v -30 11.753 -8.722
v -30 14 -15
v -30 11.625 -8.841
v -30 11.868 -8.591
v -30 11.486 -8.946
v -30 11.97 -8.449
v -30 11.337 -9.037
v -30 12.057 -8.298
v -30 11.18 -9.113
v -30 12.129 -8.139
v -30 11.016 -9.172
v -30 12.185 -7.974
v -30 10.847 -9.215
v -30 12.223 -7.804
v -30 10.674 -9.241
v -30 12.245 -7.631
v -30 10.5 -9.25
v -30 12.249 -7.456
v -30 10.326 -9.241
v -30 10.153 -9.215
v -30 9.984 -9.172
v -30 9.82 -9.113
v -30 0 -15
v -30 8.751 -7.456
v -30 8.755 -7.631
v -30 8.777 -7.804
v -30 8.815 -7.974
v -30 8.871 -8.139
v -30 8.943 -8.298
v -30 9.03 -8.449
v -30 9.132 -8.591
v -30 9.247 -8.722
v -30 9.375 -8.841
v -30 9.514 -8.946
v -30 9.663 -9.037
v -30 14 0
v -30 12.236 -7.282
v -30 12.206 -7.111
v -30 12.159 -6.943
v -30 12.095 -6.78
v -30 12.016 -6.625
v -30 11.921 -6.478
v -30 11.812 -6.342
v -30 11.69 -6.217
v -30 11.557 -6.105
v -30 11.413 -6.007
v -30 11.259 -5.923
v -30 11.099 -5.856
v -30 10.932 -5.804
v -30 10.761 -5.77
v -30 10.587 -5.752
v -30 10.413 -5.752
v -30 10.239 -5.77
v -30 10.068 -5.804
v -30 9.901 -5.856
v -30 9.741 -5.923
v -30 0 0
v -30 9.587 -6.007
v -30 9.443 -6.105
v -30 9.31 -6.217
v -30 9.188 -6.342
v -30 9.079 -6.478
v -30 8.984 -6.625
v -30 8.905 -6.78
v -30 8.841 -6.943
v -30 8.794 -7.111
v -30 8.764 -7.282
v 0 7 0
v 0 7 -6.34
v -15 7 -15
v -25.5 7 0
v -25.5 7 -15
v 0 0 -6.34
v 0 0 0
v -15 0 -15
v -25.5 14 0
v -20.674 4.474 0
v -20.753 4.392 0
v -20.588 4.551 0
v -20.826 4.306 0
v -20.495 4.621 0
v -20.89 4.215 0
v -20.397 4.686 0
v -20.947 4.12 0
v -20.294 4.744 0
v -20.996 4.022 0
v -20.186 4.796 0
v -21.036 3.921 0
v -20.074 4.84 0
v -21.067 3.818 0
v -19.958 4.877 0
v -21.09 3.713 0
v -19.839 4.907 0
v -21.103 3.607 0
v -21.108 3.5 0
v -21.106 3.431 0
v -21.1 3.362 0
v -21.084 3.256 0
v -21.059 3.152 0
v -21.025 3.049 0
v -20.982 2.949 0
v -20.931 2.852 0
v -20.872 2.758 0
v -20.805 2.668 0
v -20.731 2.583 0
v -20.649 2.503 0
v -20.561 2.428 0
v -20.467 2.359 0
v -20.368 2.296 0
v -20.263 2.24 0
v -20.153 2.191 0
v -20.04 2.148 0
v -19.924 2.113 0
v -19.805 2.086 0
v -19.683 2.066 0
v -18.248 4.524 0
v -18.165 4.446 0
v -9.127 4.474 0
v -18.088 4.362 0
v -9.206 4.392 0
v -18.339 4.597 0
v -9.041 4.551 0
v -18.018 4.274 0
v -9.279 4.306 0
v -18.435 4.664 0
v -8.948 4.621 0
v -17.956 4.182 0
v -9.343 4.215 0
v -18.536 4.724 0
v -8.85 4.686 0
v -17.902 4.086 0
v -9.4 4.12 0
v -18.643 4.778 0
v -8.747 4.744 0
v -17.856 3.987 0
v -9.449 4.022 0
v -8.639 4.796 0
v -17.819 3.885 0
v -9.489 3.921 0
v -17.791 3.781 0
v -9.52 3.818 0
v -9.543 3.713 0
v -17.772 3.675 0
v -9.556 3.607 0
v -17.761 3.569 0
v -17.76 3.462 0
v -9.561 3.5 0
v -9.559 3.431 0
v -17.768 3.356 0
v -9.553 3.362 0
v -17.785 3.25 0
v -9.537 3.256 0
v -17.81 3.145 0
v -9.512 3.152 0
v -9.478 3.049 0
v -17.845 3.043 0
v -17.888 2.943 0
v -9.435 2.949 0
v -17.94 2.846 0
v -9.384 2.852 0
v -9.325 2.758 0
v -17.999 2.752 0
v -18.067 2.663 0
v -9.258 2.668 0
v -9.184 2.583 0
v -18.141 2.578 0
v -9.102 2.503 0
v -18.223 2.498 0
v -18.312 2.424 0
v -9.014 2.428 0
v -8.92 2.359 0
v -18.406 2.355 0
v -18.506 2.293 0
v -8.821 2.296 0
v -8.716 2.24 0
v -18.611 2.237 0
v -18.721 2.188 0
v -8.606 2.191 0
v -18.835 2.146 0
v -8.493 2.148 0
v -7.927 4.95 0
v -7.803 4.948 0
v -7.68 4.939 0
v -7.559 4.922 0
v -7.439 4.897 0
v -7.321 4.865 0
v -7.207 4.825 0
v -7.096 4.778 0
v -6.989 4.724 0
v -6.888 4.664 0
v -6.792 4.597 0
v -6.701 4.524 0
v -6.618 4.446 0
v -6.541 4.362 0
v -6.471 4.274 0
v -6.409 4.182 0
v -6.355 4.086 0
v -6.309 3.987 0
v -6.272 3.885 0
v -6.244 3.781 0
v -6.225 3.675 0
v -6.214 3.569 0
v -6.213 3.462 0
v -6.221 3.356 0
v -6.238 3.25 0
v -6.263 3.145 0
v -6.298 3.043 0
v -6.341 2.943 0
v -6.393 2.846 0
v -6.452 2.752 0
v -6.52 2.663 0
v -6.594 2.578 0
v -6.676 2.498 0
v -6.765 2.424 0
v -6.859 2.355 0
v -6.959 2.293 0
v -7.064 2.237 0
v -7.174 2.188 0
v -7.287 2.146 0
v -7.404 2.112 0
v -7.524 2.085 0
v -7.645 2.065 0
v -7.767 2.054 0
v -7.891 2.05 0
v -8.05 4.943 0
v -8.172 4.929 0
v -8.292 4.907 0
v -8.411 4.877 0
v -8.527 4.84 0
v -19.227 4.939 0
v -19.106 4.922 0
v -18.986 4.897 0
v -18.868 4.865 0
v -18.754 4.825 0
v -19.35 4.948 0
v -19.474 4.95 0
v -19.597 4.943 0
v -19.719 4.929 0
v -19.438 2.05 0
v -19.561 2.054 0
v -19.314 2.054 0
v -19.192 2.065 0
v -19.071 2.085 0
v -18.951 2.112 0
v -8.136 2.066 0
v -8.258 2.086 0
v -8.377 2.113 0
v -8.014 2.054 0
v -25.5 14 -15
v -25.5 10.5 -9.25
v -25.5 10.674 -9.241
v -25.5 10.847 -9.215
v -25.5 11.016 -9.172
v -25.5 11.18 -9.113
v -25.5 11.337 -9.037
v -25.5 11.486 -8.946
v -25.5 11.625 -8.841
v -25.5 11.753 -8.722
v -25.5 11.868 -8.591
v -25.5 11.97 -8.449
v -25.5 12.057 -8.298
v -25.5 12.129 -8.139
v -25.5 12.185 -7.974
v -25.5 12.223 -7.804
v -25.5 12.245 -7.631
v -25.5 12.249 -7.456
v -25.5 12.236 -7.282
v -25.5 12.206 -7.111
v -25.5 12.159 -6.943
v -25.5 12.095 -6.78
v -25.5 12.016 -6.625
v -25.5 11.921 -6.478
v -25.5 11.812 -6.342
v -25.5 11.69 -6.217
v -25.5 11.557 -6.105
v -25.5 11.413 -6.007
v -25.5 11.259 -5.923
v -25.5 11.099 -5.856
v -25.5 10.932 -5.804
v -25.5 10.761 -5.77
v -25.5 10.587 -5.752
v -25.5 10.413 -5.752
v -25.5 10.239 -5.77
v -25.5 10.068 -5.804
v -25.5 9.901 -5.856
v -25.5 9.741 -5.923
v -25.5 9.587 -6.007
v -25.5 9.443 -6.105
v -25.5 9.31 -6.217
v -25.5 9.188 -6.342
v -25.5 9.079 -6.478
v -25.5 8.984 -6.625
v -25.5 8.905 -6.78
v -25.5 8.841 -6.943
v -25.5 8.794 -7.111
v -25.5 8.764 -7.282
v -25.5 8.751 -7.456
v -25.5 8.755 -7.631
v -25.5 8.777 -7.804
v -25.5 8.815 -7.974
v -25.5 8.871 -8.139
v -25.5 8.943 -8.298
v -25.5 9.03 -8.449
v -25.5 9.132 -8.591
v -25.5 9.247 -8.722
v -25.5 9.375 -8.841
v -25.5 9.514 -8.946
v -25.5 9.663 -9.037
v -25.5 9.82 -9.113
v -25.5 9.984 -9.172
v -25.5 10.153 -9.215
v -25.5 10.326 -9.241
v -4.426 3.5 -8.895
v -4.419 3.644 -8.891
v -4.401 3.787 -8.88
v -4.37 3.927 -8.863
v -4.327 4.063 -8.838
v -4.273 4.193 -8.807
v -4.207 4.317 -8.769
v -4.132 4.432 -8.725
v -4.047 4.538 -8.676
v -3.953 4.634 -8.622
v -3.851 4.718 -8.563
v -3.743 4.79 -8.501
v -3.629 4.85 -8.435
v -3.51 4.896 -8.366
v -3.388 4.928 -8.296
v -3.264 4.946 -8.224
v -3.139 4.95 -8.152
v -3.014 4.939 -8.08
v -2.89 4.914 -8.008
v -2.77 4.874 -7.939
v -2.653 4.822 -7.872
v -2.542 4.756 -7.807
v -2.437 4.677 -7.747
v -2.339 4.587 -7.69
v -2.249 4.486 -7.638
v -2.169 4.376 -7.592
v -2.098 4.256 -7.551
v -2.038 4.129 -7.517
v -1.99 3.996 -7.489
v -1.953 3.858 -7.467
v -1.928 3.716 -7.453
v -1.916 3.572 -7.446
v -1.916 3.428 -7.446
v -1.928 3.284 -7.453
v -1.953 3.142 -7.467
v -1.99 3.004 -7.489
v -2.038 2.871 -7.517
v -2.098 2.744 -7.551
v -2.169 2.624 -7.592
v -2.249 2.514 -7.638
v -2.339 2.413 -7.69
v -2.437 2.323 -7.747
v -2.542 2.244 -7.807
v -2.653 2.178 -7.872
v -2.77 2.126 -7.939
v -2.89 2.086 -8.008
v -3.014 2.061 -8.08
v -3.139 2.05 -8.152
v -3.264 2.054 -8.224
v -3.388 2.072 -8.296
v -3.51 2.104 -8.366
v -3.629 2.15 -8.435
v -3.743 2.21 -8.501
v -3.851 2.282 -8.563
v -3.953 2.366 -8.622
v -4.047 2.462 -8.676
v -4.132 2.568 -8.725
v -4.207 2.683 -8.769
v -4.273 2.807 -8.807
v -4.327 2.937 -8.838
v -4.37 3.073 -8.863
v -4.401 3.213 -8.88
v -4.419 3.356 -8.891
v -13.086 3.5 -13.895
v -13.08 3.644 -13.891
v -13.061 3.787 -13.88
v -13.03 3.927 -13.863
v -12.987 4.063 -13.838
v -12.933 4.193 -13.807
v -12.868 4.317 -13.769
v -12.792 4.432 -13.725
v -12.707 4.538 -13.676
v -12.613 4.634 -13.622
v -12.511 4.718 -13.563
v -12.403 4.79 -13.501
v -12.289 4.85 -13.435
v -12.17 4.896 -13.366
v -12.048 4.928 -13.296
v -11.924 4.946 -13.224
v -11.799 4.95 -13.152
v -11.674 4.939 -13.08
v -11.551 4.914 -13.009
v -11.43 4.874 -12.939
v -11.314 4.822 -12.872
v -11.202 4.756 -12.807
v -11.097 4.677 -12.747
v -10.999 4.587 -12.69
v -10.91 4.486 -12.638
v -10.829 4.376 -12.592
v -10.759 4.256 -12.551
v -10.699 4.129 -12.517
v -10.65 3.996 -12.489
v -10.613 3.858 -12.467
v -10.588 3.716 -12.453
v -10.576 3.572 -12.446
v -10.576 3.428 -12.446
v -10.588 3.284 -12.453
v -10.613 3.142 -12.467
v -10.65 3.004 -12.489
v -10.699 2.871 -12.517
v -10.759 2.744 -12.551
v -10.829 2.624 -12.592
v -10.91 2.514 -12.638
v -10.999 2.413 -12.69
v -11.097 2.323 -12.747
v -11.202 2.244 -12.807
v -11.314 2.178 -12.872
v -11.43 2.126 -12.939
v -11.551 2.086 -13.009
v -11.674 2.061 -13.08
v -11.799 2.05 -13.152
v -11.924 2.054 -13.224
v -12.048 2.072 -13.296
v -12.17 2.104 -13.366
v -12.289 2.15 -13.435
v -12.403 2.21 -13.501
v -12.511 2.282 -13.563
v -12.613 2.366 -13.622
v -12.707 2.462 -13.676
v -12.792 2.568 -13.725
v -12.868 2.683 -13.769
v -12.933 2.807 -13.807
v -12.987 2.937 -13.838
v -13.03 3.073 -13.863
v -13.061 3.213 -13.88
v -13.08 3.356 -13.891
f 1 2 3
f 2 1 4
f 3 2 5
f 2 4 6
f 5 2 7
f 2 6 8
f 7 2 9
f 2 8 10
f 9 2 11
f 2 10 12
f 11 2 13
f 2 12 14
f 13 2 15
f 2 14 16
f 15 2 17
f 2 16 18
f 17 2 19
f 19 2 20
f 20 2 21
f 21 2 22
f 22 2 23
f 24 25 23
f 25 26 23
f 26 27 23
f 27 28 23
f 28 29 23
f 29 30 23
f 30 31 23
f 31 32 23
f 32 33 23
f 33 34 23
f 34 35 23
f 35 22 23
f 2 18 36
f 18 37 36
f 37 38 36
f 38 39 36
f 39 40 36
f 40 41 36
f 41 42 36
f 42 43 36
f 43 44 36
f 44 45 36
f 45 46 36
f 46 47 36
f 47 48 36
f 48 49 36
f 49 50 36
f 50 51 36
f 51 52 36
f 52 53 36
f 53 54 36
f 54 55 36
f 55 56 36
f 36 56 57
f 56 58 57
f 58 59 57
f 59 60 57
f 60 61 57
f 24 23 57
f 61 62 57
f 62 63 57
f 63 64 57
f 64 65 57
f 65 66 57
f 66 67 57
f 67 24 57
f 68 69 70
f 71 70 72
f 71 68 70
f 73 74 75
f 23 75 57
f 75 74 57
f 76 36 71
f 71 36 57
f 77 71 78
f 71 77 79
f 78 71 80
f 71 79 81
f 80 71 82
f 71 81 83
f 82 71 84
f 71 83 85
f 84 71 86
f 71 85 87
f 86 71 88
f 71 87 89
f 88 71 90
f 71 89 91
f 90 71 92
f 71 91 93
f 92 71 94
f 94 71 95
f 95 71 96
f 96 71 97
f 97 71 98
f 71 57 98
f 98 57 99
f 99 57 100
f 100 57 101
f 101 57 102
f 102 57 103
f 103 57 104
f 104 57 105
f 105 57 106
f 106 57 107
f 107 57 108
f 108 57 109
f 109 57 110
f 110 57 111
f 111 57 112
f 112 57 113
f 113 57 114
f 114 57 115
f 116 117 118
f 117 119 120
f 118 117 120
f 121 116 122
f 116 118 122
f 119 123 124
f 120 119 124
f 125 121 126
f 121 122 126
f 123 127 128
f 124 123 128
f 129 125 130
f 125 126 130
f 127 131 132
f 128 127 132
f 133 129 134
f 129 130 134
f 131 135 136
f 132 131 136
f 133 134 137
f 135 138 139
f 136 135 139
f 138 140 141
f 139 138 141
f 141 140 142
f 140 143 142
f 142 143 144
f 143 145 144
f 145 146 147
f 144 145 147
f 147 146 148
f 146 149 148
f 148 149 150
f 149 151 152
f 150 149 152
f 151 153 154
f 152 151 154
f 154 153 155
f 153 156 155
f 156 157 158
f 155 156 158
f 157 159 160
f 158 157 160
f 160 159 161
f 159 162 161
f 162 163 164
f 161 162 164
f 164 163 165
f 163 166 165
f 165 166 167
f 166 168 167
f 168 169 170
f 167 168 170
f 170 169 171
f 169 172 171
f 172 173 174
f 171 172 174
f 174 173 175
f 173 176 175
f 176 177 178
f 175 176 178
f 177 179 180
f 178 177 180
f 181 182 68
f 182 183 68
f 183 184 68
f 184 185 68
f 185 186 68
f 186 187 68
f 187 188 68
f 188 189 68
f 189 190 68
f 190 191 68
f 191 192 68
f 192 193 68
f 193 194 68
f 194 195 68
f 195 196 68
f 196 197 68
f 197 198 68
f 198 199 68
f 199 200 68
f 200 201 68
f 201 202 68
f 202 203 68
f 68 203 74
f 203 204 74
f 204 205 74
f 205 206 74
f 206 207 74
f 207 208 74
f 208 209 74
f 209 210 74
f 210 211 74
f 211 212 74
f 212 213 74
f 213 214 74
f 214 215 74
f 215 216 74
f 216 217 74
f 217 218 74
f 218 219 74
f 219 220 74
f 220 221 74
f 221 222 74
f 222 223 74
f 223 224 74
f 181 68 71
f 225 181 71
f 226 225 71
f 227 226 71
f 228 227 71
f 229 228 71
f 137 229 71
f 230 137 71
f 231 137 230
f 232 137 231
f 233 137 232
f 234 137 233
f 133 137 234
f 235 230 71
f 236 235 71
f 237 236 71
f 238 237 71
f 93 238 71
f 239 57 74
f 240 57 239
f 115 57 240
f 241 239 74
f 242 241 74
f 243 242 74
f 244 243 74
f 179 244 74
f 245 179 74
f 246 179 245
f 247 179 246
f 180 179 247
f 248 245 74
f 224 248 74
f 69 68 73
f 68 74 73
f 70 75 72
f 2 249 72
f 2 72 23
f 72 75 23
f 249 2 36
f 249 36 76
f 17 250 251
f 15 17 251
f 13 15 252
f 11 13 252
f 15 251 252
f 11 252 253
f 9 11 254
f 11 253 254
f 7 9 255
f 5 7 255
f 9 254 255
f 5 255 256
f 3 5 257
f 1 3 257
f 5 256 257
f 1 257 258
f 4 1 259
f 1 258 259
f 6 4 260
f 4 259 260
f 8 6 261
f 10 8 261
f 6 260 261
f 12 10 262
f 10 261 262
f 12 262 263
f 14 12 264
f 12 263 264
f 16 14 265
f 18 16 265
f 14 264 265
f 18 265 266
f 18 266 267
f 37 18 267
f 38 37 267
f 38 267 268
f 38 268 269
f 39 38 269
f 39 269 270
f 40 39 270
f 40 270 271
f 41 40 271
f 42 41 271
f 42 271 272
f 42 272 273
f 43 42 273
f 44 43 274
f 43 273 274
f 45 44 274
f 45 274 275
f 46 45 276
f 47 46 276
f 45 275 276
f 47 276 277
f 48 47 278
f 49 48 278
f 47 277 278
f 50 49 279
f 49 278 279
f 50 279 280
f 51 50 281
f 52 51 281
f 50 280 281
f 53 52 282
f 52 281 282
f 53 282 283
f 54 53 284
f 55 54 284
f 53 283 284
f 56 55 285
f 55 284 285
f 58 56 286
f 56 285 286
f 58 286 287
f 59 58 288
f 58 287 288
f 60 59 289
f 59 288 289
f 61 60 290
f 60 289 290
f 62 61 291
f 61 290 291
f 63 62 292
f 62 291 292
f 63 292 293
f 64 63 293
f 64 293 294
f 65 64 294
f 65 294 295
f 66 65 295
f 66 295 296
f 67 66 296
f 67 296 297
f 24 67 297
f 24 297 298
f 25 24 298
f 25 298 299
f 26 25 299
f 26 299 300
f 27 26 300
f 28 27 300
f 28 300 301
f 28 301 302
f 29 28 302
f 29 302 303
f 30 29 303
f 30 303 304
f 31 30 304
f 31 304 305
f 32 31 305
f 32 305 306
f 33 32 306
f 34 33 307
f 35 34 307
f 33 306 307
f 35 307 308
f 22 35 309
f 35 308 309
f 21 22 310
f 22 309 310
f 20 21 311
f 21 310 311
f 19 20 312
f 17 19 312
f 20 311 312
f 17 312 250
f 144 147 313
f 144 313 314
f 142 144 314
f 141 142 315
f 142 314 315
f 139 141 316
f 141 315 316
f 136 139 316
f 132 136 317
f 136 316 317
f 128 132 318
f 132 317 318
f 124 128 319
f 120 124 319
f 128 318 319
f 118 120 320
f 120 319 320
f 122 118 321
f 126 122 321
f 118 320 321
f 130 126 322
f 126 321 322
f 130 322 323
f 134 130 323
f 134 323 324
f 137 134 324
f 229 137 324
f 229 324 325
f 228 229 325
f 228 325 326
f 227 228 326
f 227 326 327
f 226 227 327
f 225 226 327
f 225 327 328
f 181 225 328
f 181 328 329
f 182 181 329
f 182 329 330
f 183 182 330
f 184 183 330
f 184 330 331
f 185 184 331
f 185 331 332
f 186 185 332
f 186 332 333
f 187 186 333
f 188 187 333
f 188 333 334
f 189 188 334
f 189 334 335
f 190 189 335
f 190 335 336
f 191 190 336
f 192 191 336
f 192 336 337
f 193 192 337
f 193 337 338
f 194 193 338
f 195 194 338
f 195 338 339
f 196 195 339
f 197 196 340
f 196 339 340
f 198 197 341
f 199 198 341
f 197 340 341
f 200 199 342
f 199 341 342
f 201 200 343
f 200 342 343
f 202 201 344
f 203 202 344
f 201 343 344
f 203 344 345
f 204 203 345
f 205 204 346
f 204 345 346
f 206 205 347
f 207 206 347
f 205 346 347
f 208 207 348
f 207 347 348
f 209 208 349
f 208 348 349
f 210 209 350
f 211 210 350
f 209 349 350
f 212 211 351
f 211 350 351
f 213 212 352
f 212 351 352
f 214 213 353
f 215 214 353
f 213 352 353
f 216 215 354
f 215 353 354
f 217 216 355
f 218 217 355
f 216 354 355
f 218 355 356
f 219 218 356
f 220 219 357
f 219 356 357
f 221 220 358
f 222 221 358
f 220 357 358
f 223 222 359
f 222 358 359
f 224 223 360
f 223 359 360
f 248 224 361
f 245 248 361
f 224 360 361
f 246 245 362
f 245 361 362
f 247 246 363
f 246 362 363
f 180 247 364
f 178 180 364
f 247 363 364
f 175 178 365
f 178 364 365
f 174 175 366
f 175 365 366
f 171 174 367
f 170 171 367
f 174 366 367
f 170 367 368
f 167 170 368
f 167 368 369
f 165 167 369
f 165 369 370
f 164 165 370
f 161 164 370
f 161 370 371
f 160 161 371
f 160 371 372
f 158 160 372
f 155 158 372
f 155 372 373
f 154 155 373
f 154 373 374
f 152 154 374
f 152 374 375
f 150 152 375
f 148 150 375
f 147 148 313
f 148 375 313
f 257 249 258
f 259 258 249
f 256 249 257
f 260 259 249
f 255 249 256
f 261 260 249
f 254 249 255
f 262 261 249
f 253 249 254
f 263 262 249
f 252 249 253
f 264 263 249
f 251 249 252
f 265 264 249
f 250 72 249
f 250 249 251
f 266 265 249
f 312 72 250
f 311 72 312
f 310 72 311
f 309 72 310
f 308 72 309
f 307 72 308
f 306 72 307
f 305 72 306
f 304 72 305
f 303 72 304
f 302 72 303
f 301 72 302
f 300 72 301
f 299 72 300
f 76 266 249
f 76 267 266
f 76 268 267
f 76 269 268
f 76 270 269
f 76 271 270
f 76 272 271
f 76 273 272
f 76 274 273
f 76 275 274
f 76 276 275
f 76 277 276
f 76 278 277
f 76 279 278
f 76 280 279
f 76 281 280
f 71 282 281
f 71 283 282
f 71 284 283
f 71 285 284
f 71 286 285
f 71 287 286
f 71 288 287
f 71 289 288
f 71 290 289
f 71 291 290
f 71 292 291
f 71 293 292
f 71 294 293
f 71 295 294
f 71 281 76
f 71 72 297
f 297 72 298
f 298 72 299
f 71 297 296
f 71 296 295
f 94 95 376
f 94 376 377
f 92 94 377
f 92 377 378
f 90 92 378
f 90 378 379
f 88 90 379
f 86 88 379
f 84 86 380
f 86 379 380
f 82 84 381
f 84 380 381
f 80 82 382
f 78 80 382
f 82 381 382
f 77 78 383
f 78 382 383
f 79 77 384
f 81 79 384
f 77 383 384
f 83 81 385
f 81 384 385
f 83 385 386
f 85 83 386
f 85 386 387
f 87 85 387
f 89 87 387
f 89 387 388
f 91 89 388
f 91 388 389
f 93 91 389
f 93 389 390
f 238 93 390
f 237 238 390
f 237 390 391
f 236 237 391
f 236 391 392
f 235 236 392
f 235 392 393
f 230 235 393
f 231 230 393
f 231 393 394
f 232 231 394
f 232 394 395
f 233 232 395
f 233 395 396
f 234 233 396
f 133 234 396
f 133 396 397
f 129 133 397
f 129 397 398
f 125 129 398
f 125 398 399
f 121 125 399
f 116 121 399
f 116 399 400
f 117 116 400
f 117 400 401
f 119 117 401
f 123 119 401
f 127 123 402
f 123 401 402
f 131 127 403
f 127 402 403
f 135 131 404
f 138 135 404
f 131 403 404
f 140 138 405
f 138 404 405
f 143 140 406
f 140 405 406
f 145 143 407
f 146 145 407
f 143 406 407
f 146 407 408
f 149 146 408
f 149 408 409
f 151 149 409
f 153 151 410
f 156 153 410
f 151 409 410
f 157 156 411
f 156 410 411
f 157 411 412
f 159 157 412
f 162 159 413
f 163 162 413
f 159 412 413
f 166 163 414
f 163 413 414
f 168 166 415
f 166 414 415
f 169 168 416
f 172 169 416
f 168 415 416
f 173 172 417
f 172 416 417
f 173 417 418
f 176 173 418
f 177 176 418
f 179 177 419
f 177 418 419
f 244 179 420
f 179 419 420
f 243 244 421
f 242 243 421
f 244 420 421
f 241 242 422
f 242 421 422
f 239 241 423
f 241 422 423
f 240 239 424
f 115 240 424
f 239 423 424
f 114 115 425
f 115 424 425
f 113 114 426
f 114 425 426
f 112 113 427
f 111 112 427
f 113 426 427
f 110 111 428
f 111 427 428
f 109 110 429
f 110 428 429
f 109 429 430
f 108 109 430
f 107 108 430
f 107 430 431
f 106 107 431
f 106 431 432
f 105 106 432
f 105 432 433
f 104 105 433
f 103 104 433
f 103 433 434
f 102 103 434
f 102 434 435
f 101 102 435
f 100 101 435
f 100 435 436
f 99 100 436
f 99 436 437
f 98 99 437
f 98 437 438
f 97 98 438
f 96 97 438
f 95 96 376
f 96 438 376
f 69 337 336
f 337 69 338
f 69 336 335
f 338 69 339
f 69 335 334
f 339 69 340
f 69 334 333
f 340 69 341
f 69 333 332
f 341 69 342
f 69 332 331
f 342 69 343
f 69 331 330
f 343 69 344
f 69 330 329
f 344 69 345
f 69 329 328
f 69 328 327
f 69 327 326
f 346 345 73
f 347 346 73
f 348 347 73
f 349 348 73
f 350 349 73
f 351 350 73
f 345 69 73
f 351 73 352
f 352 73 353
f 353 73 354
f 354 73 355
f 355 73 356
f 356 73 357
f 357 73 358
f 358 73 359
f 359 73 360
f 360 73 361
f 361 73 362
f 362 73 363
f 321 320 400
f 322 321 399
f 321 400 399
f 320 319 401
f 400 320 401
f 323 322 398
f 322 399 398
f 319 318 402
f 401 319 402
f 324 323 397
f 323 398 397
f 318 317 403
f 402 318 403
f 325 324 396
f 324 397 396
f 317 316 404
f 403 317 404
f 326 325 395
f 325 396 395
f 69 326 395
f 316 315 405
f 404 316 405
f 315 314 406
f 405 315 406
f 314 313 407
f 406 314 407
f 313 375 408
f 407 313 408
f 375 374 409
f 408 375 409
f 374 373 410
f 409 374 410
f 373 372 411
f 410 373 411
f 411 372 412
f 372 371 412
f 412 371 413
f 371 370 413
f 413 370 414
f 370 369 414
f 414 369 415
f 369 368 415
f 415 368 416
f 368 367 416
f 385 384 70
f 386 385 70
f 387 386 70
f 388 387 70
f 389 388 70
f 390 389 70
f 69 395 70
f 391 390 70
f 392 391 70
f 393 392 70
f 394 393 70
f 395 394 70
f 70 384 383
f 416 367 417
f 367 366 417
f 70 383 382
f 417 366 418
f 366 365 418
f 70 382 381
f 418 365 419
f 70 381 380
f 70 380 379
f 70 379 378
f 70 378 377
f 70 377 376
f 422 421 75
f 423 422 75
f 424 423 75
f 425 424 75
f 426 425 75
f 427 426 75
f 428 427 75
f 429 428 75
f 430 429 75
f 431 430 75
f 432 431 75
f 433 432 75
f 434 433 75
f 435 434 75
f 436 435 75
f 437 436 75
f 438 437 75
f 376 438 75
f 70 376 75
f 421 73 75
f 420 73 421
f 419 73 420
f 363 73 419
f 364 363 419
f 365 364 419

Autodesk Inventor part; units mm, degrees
ref_plane "YZ Plane" through (0, 0, 0) normal (1, 0, 0) x (0, 1, 0)
ref_plane "XZ Plane" through (0, 0, 0) normal (0, 1, 0) x (-1, 0, 0)
ref_plane "XY Plane" through (0, 0, 0) normal (0, 0, 1) x (1, 0, 0)
sketch "Sketch1" plane through (0, 0, 0) normal (0, 1, 0) x (-1, 0, 0)
  line L0 (0, 0) -> (0, -6.3397)
  line L1 (0, -6.3397) -> (15, -15)
  line L2 (30, 0) -> (0, 0)
  line L3 (30, 0) -> (30, -15)
  line L4 (30, -15) -> (15, -15)
  dimension "d1" = 60
  dimension "d25" = 15
  dimension "d26" = 15
  dimension "d27" = 15
extrude "Extrusion1" add sketch "Sketch1" along normal blind 7
sketch "Sketch2" plane through (-15, 0, -15) normal (0.5, 0, -0.866) x (-0.866, 0, -0.5)
  line L0 (-17.3205, 0) -> (0, 0) projected
  line L1 (0, 0) -> (0, 7) projected
  line L2 (-17.3205, 7) -> (0, 7) projected
  line L3 (-17.3205, 0) -> (-17.3205, 7) projected
  circle A0 centre (-3.6603, 3.5) radius 1.45
  circle A1 centre (-13.6603, 3.5) radius 1.45
  point P0 (-20.4904, 0)
  dimension "d5" = 2.9
  dimension "d6" = 10
  dimension "d8" = 7
  dimension "d9" = 3.5
  dimension "d10" = 17.3205
  dimension "d11" = 3.6603
extrude "Extrusion2" cut sketch "Sketch2" against normal through all contours A0 | A1
sketch "Sketch6" plane through (0, 7, 0) normal (0, 1, 0) x (1, 0, 0)
  line L0 (0, 0) -> (0, 6.3397) projected
  line L1 (0, 6.3397) -> (-15, 15) projected
  line L2 (-15, 15) -> (-30, 15) projected
  line L3 (-30, 15) -> (-30, 0) projected
  line L4 (-30, 0) -> (0, 0) projected
  line L5 (0, 6.3397) -> (-15, 15) projected
  line L6 (-30, 0) -> (0, 0) projected
  line L7 (-25.5, 15) -> (-25.5, 0)
  dimension "d34" = 4.5
extrude "Extrusion5" add sketch "Sketch6" along normal blind 7 contours L4 L3 L2 L7
sketch "Sketch8" plane through (-25.5, 7, 0) normal (1, 0, 0) x (0, 0, -1)
  line L0 (15, 0) -> (0, 0) projected
  line L1 (15, 0) -> (15, 7) projected
  line L2 (0, 7) -> (15, 7) projected
  line L3 (0, 0) -> (0, 7) projected
  circle A0 centre (7.5, 3.5) radius 1.75
  point P0 (0, -7)
  point P1 (0, 3.5)
  point P2 (7.5, 0)
  dimension "d35" = 3.5
extrude "Extrusion7" cut sketch "Sketch8" against normal through all contours A0
equation "\"d9\" = 0.5 * d8"
equation "\"d11\" = -0.5 * d6 + 0.5 * d10"
properties part number "LEDBracket" material "ABS Plastic"
